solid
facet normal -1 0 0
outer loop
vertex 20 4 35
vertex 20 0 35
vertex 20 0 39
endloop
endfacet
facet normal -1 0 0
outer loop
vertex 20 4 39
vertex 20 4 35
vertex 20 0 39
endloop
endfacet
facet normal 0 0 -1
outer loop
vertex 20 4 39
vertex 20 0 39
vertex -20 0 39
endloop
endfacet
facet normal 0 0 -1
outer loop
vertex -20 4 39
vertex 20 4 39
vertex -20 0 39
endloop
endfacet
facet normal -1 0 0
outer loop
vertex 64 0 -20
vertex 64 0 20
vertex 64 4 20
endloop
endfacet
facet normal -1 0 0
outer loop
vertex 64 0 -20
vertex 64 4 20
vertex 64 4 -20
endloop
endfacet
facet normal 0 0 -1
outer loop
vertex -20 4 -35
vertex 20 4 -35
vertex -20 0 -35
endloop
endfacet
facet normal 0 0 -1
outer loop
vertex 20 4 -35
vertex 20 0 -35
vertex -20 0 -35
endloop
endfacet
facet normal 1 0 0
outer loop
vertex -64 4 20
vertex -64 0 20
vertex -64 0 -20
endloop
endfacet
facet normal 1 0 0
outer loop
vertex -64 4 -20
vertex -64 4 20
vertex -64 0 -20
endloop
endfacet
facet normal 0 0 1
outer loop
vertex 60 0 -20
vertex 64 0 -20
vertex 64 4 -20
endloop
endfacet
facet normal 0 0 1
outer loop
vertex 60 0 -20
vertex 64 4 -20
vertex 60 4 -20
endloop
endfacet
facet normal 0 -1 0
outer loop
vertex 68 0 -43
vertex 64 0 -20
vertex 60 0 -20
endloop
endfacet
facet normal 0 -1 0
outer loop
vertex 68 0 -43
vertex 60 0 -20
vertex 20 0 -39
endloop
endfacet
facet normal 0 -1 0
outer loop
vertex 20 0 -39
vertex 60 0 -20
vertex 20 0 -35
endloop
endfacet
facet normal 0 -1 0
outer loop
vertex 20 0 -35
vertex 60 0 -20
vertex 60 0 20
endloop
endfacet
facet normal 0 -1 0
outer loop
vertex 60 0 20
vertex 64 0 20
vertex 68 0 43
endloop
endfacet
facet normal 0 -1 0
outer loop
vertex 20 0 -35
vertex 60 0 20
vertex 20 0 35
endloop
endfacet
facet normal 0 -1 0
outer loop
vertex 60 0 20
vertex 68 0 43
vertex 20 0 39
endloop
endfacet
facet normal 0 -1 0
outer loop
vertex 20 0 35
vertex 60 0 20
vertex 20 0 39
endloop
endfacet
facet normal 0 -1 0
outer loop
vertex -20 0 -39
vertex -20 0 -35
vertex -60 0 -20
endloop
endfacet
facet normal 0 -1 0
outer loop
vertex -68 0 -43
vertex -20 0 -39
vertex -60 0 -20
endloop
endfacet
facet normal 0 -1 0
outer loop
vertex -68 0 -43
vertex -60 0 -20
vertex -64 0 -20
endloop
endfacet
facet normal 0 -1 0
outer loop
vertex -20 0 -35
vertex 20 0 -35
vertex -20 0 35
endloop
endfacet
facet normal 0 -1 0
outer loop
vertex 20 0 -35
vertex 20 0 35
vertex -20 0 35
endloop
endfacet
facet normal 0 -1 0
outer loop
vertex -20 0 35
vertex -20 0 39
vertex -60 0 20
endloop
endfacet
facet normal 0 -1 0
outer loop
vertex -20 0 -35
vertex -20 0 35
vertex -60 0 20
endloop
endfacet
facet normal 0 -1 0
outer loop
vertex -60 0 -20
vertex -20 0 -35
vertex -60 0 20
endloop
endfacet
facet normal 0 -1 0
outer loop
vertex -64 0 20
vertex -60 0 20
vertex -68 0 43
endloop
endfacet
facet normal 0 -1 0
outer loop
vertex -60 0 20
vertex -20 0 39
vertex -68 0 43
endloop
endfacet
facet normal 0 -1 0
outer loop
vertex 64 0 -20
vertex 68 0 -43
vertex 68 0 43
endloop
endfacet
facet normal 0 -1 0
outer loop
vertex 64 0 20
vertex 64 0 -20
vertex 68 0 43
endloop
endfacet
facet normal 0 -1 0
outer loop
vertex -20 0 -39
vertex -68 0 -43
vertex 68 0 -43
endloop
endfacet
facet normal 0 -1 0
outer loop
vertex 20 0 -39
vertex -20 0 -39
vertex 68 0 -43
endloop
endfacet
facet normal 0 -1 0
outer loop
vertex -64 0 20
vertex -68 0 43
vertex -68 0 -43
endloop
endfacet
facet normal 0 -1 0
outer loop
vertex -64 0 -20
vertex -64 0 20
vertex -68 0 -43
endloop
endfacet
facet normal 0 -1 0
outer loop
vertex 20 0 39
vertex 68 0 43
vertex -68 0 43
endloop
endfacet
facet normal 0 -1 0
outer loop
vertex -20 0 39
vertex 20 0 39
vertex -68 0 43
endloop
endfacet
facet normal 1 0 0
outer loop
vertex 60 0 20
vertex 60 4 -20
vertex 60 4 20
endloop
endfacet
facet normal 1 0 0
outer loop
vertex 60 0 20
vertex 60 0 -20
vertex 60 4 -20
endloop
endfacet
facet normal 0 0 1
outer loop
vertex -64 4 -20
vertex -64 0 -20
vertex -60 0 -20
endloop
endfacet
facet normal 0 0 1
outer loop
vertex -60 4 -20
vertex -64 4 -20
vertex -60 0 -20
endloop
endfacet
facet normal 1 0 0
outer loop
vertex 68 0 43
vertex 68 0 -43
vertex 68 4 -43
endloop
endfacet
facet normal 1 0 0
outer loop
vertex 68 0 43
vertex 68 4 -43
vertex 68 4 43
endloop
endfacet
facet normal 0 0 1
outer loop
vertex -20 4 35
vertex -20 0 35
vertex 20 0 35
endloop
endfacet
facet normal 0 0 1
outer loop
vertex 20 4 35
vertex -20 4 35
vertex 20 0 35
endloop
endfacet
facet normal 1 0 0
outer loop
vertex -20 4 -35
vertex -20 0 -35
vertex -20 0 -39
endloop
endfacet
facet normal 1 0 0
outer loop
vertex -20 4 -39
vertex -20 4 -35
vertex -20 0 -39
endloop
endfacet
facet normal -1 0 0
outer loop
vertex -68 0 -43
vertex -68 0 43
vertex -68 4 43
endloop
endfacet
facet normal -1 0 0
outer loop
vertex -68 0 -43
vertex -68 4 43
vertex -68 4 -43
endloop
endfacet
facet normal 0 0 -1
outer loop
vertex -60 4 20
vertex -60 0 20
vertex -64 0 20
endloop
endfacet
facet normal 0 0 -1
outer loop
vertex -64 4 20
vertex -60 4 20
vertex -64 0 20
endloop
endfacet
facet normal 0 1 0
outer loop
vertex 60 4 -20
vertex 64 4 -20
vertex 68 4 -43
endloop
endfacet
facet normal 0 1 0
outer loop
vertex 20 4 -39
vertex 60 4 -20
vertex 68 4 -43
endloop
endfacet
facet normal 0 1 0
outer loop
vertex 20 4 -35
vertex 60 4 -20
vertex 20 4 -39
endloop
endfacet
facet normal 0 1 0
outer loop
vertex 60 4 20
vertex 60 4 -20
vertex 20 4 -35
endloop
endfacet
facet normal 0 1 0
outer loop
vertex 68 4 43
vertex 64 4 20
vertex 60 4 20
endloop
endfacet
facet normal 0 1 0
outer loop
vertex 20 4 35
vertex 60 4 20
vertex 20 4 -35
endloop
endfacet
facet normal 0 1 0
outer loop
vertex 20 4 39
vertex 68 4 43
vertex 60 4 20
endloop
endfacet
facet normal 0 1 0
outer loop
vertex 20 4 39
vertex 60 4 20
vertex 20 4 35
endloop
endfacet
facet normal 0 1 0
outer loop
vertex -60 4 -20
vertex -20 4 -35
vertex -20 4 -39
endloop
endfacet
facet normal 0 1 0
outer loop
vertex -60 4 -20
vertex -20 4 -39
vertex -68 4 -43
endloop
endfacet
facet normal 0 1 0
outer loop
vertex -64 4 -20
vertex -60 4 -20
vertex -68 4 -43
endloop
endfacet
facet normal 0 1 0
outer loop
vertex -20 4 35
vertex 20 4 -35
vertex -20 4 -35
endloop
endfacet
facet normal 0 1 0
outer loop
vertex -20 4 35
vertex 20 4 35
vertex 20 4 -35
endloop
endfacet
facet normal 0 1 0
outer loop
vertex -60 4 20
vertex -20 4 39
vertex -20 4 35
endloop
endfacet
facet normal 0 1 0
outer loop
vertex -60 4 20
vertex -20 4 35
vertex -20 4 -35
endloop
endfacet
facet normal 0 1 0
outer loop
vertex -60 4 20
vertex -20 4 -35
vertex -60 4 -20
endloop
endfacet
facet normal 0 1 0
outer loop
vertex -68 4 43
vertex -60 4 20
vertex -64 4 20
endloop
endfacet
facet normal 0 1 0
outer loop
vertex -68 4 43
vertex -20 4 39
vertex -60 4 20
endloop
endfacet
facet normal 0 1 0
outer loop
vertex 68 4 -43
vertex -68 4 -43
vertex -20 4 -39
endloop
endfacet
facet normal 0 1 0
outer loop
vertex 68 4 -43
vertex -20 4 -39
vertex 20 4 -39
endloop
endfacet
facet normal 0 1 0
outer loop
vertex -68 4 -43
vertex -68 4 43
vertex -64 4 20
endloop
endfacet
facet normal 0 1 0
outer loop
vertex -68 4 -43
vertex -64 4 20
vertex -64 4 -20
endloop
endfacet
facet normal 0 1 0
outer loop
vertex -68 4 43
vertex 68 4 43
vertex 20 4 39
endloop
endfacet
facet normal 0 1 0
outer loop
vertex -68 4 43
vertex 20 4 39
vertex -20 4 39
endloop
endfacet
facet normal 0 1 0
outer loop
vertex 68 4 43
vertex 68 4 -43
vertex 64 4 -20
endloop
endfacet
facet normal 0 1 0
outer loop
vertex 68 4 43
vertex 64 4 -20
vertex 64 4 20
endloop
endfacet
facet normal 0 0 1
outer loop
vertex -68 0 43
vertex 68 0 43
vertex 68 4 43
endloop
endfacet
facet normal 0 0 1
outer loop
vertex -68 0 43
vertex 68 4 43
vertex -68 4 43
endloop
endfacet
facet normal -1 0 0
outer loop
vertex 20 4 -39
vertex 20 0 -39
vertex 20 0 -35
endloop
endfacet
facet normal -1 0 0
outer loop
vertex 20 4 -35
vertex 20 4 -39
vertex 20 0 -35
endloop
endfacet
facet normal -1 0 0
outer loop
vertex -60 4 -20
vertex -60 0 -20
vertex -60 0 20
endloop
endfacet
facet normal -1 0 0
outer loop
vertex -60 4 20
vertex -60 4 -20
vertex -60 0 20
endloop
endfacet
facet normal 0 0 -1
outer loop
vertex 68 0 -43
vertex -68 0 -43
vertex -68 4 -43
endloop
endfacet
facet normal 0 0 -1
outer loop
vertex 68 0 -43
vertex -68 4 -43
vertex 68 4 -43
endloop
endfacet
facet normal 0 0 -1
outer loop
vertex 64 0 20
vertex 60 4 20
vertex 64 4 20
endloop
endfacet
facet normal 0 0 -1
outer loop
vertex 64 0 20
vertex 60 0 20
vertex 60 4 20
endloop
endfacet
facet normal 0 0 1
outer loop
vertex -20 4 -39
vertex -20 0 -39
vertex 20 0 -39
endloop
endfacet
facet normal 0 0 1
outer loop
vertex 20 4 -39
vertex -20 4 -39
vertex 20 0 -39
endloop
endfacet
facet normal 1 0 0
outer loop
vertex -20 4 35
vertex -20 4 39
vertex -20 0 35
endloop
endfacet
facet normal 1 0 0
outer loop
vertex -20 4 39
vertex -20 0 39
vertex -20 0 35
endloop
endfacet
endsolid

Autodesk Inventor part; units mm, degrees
ref_plane "YZ Plane" through (0, 0, 0) normal (1, 0, 0) x (0, 1, 0)
ref_plane "XZ Plane" through (0, 0, 0) normal (0, 1, 0) x (-1, 0, 0)
ref_plane "XY Plane" through (0, 0, 0) normal (0, 0, 1) x (1, 0, 0)
sketch "Sketch1" plane through (0, 0, 0) normal (0, 1, 0) x (-1, 0, 0)
  line L0 (60, -35) -> (-60, -35) construction
  line L1 (-60, -35) -> (-60, 35) construction
  line L2 (-60, 35) -> (60, 35) construction
  line L3 (60, 35) -> (60, -35) construction
  line L4 (64, -39) -> (-64, -39) construction
  line L5 (-64, -39) -> (-64, 39) construction
  line L6 (-64, 39) -> (64, 39) construction
  line L7 (64, 39) -> (64, -39) construction
  line L8 (68, -43) -> (-68, -43)
  line L9 (-68, -43) -> (-68, 43)
  line L10 (-68, 43) -> (68, 43)
  line L11 (68, 43) -> (68, -43)
  line L12 (64, -20) -> (60, -20)
  line L13 (60, -20) -> (60, 20)
  line L14 (60, 20) -> (64, 20)
  line L15 (64, 20) -> (64, -20)
  line L16 (-60, 20) -> (-64, 20)
  line L17 (-64, 20) -> (-64, -20)
  line L18 (-64, -20) -> (-60, -20)
  line L19 (-60, -20) -> (-60, 20)
  line L20 (-20, -35) -> (20, -35)
  line L21 (20, -35) -> (20, -39)
  line L22 (20, -39) -> (-20, -39)
  line L23 (-20, -39) -> (-20, -35)
  line L24 (20, 35) -> (-20, 35)
  line L25 (-20, 35) -> (-20, 39)
  line L26 (-20, 39) -> (20, 39)
  line L27 (20, 39) -> (20, 35)
  point P0 (0, 0)
  point P1 (0, -35)
  point P2 (60, 0)
  point P3 (60, 0)
  point P4 (0, -35)
  point P5 (62, 20)
  point P6 (62, -20)
  dimension "d0" = 4
  dimension "d1" = 4
  dimension "d2" = 120
  dimension "d3" = 70
  dimension "d4" = 40
extrude "Extrusion1" add sketch "Sketch1" along normal blind 4
properties part number "Top_12wx70d" material "Wood (Oak)"
